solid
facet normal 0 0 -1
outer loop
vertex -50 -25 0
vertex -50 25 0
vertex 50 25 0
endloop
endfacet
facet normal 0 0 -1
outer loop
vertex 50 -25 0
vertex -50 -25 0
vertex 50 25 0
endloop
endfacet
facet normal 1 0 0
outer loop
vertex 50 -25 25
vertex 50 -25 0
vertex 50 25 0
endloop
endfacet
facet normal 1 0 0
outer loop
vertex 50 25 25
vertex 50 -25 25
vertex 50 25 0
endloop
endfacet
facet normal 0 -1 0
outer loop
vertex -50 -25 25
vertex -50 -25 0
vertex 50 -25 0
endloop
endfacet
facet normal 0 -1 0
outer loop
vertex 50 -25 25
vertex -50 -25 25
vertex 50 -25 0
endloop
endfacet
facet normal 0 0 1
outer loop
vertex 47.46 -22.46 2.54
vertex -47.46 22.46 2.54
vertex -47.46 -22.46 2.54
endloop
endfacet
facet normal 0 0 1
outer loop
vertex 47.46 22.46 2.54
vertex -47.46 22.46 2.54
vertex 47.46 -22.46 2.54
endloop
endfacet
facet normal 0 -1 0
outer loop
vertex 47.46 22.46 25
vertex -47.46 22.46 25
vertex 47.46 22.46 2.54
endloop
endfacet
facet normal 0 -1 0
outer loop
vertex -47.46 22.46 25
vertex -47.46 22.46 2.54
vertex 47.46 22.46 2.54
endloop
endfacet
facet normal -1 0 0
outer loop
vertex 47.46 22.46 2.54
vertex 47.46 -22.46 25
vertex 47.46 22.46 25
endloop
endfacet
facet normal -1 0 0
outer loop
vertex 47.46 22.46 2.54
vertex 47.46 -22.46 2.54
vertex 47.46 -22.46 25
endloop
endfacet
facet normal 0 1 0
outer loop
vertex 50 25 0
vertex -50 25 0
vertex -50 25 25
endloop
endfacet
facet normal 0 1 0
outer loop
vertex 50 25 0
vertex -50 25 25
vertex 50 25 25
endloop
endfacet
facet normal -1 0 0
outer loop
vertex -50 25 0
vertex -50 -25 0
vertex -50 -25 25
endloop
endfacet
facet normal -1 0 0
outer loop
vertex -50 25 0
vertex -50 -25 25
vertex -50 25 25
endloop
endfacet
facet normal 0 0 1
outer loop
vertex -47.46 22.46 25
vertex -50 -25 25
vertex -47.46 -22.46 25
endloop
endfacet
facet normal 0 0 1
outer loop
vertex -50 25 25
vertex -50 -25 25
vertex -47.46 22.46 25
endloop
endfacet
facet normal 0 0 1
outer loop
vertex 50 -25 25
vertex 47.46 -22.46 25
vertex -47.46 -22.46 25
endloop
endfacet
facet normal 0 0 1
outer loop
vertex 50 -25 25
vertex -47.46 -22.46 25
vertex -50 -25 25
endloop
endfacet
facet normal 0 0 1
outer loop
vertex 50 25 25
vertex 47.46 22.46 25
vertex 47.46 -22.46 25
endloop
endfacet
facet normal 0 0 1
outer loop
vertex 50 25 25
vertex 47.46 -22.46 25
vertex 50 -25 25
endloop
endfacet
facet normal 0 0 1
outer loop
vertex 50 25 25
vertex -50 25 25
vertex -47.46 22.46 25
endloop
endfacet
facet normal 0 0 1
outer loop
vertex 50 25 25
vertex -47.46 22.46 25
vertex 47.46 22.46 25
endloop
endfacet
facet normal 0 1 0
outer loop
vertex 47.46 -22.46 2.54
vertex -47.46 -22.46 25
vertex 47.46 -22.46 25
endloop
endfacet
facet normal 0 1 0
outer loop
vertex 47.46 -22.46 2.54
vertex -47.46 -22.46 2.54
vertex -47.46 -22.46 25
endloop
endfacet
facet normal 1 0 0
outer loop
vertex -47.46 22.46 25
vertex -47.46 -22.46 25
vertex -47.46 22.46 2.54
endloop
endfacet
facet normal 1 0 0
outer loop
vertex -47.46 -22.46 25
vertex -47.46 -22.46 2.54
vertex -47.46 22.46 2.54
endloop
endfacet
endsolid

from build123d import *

# Parameters (mm, degrees)
F0_W     = 100
F0_H     = 50
F1_DEPTH = 25
F2_T     = -2.54
F3_R     = 7.874883
F4_DEPTH = 25.4


with BuildPart() as f1:
    # F0 (on Top) → F1 (new body)
    with BuildSketch(Plane.XY):
        Rectangle(F0_W, F0_H)
    extrude(amount=F1_DEPTH)

    # F2
    f2_openings = [f1.faces().sort_by_distance(p)[0] for p in [
        (0, 0, 25),
    ]]
    offset(amount=F2_T, openings=f2_openings)

    # F3 (on face) → F4 (cut)
    with BuildSketch(Plane.YZ.offset(50)):
        with Locations((0, 13.071434)):
            Circle(F3_R)
    extrude(amount=F4_DEPTH, mode=Mode.SUBTRACT)


solid = f1.part
